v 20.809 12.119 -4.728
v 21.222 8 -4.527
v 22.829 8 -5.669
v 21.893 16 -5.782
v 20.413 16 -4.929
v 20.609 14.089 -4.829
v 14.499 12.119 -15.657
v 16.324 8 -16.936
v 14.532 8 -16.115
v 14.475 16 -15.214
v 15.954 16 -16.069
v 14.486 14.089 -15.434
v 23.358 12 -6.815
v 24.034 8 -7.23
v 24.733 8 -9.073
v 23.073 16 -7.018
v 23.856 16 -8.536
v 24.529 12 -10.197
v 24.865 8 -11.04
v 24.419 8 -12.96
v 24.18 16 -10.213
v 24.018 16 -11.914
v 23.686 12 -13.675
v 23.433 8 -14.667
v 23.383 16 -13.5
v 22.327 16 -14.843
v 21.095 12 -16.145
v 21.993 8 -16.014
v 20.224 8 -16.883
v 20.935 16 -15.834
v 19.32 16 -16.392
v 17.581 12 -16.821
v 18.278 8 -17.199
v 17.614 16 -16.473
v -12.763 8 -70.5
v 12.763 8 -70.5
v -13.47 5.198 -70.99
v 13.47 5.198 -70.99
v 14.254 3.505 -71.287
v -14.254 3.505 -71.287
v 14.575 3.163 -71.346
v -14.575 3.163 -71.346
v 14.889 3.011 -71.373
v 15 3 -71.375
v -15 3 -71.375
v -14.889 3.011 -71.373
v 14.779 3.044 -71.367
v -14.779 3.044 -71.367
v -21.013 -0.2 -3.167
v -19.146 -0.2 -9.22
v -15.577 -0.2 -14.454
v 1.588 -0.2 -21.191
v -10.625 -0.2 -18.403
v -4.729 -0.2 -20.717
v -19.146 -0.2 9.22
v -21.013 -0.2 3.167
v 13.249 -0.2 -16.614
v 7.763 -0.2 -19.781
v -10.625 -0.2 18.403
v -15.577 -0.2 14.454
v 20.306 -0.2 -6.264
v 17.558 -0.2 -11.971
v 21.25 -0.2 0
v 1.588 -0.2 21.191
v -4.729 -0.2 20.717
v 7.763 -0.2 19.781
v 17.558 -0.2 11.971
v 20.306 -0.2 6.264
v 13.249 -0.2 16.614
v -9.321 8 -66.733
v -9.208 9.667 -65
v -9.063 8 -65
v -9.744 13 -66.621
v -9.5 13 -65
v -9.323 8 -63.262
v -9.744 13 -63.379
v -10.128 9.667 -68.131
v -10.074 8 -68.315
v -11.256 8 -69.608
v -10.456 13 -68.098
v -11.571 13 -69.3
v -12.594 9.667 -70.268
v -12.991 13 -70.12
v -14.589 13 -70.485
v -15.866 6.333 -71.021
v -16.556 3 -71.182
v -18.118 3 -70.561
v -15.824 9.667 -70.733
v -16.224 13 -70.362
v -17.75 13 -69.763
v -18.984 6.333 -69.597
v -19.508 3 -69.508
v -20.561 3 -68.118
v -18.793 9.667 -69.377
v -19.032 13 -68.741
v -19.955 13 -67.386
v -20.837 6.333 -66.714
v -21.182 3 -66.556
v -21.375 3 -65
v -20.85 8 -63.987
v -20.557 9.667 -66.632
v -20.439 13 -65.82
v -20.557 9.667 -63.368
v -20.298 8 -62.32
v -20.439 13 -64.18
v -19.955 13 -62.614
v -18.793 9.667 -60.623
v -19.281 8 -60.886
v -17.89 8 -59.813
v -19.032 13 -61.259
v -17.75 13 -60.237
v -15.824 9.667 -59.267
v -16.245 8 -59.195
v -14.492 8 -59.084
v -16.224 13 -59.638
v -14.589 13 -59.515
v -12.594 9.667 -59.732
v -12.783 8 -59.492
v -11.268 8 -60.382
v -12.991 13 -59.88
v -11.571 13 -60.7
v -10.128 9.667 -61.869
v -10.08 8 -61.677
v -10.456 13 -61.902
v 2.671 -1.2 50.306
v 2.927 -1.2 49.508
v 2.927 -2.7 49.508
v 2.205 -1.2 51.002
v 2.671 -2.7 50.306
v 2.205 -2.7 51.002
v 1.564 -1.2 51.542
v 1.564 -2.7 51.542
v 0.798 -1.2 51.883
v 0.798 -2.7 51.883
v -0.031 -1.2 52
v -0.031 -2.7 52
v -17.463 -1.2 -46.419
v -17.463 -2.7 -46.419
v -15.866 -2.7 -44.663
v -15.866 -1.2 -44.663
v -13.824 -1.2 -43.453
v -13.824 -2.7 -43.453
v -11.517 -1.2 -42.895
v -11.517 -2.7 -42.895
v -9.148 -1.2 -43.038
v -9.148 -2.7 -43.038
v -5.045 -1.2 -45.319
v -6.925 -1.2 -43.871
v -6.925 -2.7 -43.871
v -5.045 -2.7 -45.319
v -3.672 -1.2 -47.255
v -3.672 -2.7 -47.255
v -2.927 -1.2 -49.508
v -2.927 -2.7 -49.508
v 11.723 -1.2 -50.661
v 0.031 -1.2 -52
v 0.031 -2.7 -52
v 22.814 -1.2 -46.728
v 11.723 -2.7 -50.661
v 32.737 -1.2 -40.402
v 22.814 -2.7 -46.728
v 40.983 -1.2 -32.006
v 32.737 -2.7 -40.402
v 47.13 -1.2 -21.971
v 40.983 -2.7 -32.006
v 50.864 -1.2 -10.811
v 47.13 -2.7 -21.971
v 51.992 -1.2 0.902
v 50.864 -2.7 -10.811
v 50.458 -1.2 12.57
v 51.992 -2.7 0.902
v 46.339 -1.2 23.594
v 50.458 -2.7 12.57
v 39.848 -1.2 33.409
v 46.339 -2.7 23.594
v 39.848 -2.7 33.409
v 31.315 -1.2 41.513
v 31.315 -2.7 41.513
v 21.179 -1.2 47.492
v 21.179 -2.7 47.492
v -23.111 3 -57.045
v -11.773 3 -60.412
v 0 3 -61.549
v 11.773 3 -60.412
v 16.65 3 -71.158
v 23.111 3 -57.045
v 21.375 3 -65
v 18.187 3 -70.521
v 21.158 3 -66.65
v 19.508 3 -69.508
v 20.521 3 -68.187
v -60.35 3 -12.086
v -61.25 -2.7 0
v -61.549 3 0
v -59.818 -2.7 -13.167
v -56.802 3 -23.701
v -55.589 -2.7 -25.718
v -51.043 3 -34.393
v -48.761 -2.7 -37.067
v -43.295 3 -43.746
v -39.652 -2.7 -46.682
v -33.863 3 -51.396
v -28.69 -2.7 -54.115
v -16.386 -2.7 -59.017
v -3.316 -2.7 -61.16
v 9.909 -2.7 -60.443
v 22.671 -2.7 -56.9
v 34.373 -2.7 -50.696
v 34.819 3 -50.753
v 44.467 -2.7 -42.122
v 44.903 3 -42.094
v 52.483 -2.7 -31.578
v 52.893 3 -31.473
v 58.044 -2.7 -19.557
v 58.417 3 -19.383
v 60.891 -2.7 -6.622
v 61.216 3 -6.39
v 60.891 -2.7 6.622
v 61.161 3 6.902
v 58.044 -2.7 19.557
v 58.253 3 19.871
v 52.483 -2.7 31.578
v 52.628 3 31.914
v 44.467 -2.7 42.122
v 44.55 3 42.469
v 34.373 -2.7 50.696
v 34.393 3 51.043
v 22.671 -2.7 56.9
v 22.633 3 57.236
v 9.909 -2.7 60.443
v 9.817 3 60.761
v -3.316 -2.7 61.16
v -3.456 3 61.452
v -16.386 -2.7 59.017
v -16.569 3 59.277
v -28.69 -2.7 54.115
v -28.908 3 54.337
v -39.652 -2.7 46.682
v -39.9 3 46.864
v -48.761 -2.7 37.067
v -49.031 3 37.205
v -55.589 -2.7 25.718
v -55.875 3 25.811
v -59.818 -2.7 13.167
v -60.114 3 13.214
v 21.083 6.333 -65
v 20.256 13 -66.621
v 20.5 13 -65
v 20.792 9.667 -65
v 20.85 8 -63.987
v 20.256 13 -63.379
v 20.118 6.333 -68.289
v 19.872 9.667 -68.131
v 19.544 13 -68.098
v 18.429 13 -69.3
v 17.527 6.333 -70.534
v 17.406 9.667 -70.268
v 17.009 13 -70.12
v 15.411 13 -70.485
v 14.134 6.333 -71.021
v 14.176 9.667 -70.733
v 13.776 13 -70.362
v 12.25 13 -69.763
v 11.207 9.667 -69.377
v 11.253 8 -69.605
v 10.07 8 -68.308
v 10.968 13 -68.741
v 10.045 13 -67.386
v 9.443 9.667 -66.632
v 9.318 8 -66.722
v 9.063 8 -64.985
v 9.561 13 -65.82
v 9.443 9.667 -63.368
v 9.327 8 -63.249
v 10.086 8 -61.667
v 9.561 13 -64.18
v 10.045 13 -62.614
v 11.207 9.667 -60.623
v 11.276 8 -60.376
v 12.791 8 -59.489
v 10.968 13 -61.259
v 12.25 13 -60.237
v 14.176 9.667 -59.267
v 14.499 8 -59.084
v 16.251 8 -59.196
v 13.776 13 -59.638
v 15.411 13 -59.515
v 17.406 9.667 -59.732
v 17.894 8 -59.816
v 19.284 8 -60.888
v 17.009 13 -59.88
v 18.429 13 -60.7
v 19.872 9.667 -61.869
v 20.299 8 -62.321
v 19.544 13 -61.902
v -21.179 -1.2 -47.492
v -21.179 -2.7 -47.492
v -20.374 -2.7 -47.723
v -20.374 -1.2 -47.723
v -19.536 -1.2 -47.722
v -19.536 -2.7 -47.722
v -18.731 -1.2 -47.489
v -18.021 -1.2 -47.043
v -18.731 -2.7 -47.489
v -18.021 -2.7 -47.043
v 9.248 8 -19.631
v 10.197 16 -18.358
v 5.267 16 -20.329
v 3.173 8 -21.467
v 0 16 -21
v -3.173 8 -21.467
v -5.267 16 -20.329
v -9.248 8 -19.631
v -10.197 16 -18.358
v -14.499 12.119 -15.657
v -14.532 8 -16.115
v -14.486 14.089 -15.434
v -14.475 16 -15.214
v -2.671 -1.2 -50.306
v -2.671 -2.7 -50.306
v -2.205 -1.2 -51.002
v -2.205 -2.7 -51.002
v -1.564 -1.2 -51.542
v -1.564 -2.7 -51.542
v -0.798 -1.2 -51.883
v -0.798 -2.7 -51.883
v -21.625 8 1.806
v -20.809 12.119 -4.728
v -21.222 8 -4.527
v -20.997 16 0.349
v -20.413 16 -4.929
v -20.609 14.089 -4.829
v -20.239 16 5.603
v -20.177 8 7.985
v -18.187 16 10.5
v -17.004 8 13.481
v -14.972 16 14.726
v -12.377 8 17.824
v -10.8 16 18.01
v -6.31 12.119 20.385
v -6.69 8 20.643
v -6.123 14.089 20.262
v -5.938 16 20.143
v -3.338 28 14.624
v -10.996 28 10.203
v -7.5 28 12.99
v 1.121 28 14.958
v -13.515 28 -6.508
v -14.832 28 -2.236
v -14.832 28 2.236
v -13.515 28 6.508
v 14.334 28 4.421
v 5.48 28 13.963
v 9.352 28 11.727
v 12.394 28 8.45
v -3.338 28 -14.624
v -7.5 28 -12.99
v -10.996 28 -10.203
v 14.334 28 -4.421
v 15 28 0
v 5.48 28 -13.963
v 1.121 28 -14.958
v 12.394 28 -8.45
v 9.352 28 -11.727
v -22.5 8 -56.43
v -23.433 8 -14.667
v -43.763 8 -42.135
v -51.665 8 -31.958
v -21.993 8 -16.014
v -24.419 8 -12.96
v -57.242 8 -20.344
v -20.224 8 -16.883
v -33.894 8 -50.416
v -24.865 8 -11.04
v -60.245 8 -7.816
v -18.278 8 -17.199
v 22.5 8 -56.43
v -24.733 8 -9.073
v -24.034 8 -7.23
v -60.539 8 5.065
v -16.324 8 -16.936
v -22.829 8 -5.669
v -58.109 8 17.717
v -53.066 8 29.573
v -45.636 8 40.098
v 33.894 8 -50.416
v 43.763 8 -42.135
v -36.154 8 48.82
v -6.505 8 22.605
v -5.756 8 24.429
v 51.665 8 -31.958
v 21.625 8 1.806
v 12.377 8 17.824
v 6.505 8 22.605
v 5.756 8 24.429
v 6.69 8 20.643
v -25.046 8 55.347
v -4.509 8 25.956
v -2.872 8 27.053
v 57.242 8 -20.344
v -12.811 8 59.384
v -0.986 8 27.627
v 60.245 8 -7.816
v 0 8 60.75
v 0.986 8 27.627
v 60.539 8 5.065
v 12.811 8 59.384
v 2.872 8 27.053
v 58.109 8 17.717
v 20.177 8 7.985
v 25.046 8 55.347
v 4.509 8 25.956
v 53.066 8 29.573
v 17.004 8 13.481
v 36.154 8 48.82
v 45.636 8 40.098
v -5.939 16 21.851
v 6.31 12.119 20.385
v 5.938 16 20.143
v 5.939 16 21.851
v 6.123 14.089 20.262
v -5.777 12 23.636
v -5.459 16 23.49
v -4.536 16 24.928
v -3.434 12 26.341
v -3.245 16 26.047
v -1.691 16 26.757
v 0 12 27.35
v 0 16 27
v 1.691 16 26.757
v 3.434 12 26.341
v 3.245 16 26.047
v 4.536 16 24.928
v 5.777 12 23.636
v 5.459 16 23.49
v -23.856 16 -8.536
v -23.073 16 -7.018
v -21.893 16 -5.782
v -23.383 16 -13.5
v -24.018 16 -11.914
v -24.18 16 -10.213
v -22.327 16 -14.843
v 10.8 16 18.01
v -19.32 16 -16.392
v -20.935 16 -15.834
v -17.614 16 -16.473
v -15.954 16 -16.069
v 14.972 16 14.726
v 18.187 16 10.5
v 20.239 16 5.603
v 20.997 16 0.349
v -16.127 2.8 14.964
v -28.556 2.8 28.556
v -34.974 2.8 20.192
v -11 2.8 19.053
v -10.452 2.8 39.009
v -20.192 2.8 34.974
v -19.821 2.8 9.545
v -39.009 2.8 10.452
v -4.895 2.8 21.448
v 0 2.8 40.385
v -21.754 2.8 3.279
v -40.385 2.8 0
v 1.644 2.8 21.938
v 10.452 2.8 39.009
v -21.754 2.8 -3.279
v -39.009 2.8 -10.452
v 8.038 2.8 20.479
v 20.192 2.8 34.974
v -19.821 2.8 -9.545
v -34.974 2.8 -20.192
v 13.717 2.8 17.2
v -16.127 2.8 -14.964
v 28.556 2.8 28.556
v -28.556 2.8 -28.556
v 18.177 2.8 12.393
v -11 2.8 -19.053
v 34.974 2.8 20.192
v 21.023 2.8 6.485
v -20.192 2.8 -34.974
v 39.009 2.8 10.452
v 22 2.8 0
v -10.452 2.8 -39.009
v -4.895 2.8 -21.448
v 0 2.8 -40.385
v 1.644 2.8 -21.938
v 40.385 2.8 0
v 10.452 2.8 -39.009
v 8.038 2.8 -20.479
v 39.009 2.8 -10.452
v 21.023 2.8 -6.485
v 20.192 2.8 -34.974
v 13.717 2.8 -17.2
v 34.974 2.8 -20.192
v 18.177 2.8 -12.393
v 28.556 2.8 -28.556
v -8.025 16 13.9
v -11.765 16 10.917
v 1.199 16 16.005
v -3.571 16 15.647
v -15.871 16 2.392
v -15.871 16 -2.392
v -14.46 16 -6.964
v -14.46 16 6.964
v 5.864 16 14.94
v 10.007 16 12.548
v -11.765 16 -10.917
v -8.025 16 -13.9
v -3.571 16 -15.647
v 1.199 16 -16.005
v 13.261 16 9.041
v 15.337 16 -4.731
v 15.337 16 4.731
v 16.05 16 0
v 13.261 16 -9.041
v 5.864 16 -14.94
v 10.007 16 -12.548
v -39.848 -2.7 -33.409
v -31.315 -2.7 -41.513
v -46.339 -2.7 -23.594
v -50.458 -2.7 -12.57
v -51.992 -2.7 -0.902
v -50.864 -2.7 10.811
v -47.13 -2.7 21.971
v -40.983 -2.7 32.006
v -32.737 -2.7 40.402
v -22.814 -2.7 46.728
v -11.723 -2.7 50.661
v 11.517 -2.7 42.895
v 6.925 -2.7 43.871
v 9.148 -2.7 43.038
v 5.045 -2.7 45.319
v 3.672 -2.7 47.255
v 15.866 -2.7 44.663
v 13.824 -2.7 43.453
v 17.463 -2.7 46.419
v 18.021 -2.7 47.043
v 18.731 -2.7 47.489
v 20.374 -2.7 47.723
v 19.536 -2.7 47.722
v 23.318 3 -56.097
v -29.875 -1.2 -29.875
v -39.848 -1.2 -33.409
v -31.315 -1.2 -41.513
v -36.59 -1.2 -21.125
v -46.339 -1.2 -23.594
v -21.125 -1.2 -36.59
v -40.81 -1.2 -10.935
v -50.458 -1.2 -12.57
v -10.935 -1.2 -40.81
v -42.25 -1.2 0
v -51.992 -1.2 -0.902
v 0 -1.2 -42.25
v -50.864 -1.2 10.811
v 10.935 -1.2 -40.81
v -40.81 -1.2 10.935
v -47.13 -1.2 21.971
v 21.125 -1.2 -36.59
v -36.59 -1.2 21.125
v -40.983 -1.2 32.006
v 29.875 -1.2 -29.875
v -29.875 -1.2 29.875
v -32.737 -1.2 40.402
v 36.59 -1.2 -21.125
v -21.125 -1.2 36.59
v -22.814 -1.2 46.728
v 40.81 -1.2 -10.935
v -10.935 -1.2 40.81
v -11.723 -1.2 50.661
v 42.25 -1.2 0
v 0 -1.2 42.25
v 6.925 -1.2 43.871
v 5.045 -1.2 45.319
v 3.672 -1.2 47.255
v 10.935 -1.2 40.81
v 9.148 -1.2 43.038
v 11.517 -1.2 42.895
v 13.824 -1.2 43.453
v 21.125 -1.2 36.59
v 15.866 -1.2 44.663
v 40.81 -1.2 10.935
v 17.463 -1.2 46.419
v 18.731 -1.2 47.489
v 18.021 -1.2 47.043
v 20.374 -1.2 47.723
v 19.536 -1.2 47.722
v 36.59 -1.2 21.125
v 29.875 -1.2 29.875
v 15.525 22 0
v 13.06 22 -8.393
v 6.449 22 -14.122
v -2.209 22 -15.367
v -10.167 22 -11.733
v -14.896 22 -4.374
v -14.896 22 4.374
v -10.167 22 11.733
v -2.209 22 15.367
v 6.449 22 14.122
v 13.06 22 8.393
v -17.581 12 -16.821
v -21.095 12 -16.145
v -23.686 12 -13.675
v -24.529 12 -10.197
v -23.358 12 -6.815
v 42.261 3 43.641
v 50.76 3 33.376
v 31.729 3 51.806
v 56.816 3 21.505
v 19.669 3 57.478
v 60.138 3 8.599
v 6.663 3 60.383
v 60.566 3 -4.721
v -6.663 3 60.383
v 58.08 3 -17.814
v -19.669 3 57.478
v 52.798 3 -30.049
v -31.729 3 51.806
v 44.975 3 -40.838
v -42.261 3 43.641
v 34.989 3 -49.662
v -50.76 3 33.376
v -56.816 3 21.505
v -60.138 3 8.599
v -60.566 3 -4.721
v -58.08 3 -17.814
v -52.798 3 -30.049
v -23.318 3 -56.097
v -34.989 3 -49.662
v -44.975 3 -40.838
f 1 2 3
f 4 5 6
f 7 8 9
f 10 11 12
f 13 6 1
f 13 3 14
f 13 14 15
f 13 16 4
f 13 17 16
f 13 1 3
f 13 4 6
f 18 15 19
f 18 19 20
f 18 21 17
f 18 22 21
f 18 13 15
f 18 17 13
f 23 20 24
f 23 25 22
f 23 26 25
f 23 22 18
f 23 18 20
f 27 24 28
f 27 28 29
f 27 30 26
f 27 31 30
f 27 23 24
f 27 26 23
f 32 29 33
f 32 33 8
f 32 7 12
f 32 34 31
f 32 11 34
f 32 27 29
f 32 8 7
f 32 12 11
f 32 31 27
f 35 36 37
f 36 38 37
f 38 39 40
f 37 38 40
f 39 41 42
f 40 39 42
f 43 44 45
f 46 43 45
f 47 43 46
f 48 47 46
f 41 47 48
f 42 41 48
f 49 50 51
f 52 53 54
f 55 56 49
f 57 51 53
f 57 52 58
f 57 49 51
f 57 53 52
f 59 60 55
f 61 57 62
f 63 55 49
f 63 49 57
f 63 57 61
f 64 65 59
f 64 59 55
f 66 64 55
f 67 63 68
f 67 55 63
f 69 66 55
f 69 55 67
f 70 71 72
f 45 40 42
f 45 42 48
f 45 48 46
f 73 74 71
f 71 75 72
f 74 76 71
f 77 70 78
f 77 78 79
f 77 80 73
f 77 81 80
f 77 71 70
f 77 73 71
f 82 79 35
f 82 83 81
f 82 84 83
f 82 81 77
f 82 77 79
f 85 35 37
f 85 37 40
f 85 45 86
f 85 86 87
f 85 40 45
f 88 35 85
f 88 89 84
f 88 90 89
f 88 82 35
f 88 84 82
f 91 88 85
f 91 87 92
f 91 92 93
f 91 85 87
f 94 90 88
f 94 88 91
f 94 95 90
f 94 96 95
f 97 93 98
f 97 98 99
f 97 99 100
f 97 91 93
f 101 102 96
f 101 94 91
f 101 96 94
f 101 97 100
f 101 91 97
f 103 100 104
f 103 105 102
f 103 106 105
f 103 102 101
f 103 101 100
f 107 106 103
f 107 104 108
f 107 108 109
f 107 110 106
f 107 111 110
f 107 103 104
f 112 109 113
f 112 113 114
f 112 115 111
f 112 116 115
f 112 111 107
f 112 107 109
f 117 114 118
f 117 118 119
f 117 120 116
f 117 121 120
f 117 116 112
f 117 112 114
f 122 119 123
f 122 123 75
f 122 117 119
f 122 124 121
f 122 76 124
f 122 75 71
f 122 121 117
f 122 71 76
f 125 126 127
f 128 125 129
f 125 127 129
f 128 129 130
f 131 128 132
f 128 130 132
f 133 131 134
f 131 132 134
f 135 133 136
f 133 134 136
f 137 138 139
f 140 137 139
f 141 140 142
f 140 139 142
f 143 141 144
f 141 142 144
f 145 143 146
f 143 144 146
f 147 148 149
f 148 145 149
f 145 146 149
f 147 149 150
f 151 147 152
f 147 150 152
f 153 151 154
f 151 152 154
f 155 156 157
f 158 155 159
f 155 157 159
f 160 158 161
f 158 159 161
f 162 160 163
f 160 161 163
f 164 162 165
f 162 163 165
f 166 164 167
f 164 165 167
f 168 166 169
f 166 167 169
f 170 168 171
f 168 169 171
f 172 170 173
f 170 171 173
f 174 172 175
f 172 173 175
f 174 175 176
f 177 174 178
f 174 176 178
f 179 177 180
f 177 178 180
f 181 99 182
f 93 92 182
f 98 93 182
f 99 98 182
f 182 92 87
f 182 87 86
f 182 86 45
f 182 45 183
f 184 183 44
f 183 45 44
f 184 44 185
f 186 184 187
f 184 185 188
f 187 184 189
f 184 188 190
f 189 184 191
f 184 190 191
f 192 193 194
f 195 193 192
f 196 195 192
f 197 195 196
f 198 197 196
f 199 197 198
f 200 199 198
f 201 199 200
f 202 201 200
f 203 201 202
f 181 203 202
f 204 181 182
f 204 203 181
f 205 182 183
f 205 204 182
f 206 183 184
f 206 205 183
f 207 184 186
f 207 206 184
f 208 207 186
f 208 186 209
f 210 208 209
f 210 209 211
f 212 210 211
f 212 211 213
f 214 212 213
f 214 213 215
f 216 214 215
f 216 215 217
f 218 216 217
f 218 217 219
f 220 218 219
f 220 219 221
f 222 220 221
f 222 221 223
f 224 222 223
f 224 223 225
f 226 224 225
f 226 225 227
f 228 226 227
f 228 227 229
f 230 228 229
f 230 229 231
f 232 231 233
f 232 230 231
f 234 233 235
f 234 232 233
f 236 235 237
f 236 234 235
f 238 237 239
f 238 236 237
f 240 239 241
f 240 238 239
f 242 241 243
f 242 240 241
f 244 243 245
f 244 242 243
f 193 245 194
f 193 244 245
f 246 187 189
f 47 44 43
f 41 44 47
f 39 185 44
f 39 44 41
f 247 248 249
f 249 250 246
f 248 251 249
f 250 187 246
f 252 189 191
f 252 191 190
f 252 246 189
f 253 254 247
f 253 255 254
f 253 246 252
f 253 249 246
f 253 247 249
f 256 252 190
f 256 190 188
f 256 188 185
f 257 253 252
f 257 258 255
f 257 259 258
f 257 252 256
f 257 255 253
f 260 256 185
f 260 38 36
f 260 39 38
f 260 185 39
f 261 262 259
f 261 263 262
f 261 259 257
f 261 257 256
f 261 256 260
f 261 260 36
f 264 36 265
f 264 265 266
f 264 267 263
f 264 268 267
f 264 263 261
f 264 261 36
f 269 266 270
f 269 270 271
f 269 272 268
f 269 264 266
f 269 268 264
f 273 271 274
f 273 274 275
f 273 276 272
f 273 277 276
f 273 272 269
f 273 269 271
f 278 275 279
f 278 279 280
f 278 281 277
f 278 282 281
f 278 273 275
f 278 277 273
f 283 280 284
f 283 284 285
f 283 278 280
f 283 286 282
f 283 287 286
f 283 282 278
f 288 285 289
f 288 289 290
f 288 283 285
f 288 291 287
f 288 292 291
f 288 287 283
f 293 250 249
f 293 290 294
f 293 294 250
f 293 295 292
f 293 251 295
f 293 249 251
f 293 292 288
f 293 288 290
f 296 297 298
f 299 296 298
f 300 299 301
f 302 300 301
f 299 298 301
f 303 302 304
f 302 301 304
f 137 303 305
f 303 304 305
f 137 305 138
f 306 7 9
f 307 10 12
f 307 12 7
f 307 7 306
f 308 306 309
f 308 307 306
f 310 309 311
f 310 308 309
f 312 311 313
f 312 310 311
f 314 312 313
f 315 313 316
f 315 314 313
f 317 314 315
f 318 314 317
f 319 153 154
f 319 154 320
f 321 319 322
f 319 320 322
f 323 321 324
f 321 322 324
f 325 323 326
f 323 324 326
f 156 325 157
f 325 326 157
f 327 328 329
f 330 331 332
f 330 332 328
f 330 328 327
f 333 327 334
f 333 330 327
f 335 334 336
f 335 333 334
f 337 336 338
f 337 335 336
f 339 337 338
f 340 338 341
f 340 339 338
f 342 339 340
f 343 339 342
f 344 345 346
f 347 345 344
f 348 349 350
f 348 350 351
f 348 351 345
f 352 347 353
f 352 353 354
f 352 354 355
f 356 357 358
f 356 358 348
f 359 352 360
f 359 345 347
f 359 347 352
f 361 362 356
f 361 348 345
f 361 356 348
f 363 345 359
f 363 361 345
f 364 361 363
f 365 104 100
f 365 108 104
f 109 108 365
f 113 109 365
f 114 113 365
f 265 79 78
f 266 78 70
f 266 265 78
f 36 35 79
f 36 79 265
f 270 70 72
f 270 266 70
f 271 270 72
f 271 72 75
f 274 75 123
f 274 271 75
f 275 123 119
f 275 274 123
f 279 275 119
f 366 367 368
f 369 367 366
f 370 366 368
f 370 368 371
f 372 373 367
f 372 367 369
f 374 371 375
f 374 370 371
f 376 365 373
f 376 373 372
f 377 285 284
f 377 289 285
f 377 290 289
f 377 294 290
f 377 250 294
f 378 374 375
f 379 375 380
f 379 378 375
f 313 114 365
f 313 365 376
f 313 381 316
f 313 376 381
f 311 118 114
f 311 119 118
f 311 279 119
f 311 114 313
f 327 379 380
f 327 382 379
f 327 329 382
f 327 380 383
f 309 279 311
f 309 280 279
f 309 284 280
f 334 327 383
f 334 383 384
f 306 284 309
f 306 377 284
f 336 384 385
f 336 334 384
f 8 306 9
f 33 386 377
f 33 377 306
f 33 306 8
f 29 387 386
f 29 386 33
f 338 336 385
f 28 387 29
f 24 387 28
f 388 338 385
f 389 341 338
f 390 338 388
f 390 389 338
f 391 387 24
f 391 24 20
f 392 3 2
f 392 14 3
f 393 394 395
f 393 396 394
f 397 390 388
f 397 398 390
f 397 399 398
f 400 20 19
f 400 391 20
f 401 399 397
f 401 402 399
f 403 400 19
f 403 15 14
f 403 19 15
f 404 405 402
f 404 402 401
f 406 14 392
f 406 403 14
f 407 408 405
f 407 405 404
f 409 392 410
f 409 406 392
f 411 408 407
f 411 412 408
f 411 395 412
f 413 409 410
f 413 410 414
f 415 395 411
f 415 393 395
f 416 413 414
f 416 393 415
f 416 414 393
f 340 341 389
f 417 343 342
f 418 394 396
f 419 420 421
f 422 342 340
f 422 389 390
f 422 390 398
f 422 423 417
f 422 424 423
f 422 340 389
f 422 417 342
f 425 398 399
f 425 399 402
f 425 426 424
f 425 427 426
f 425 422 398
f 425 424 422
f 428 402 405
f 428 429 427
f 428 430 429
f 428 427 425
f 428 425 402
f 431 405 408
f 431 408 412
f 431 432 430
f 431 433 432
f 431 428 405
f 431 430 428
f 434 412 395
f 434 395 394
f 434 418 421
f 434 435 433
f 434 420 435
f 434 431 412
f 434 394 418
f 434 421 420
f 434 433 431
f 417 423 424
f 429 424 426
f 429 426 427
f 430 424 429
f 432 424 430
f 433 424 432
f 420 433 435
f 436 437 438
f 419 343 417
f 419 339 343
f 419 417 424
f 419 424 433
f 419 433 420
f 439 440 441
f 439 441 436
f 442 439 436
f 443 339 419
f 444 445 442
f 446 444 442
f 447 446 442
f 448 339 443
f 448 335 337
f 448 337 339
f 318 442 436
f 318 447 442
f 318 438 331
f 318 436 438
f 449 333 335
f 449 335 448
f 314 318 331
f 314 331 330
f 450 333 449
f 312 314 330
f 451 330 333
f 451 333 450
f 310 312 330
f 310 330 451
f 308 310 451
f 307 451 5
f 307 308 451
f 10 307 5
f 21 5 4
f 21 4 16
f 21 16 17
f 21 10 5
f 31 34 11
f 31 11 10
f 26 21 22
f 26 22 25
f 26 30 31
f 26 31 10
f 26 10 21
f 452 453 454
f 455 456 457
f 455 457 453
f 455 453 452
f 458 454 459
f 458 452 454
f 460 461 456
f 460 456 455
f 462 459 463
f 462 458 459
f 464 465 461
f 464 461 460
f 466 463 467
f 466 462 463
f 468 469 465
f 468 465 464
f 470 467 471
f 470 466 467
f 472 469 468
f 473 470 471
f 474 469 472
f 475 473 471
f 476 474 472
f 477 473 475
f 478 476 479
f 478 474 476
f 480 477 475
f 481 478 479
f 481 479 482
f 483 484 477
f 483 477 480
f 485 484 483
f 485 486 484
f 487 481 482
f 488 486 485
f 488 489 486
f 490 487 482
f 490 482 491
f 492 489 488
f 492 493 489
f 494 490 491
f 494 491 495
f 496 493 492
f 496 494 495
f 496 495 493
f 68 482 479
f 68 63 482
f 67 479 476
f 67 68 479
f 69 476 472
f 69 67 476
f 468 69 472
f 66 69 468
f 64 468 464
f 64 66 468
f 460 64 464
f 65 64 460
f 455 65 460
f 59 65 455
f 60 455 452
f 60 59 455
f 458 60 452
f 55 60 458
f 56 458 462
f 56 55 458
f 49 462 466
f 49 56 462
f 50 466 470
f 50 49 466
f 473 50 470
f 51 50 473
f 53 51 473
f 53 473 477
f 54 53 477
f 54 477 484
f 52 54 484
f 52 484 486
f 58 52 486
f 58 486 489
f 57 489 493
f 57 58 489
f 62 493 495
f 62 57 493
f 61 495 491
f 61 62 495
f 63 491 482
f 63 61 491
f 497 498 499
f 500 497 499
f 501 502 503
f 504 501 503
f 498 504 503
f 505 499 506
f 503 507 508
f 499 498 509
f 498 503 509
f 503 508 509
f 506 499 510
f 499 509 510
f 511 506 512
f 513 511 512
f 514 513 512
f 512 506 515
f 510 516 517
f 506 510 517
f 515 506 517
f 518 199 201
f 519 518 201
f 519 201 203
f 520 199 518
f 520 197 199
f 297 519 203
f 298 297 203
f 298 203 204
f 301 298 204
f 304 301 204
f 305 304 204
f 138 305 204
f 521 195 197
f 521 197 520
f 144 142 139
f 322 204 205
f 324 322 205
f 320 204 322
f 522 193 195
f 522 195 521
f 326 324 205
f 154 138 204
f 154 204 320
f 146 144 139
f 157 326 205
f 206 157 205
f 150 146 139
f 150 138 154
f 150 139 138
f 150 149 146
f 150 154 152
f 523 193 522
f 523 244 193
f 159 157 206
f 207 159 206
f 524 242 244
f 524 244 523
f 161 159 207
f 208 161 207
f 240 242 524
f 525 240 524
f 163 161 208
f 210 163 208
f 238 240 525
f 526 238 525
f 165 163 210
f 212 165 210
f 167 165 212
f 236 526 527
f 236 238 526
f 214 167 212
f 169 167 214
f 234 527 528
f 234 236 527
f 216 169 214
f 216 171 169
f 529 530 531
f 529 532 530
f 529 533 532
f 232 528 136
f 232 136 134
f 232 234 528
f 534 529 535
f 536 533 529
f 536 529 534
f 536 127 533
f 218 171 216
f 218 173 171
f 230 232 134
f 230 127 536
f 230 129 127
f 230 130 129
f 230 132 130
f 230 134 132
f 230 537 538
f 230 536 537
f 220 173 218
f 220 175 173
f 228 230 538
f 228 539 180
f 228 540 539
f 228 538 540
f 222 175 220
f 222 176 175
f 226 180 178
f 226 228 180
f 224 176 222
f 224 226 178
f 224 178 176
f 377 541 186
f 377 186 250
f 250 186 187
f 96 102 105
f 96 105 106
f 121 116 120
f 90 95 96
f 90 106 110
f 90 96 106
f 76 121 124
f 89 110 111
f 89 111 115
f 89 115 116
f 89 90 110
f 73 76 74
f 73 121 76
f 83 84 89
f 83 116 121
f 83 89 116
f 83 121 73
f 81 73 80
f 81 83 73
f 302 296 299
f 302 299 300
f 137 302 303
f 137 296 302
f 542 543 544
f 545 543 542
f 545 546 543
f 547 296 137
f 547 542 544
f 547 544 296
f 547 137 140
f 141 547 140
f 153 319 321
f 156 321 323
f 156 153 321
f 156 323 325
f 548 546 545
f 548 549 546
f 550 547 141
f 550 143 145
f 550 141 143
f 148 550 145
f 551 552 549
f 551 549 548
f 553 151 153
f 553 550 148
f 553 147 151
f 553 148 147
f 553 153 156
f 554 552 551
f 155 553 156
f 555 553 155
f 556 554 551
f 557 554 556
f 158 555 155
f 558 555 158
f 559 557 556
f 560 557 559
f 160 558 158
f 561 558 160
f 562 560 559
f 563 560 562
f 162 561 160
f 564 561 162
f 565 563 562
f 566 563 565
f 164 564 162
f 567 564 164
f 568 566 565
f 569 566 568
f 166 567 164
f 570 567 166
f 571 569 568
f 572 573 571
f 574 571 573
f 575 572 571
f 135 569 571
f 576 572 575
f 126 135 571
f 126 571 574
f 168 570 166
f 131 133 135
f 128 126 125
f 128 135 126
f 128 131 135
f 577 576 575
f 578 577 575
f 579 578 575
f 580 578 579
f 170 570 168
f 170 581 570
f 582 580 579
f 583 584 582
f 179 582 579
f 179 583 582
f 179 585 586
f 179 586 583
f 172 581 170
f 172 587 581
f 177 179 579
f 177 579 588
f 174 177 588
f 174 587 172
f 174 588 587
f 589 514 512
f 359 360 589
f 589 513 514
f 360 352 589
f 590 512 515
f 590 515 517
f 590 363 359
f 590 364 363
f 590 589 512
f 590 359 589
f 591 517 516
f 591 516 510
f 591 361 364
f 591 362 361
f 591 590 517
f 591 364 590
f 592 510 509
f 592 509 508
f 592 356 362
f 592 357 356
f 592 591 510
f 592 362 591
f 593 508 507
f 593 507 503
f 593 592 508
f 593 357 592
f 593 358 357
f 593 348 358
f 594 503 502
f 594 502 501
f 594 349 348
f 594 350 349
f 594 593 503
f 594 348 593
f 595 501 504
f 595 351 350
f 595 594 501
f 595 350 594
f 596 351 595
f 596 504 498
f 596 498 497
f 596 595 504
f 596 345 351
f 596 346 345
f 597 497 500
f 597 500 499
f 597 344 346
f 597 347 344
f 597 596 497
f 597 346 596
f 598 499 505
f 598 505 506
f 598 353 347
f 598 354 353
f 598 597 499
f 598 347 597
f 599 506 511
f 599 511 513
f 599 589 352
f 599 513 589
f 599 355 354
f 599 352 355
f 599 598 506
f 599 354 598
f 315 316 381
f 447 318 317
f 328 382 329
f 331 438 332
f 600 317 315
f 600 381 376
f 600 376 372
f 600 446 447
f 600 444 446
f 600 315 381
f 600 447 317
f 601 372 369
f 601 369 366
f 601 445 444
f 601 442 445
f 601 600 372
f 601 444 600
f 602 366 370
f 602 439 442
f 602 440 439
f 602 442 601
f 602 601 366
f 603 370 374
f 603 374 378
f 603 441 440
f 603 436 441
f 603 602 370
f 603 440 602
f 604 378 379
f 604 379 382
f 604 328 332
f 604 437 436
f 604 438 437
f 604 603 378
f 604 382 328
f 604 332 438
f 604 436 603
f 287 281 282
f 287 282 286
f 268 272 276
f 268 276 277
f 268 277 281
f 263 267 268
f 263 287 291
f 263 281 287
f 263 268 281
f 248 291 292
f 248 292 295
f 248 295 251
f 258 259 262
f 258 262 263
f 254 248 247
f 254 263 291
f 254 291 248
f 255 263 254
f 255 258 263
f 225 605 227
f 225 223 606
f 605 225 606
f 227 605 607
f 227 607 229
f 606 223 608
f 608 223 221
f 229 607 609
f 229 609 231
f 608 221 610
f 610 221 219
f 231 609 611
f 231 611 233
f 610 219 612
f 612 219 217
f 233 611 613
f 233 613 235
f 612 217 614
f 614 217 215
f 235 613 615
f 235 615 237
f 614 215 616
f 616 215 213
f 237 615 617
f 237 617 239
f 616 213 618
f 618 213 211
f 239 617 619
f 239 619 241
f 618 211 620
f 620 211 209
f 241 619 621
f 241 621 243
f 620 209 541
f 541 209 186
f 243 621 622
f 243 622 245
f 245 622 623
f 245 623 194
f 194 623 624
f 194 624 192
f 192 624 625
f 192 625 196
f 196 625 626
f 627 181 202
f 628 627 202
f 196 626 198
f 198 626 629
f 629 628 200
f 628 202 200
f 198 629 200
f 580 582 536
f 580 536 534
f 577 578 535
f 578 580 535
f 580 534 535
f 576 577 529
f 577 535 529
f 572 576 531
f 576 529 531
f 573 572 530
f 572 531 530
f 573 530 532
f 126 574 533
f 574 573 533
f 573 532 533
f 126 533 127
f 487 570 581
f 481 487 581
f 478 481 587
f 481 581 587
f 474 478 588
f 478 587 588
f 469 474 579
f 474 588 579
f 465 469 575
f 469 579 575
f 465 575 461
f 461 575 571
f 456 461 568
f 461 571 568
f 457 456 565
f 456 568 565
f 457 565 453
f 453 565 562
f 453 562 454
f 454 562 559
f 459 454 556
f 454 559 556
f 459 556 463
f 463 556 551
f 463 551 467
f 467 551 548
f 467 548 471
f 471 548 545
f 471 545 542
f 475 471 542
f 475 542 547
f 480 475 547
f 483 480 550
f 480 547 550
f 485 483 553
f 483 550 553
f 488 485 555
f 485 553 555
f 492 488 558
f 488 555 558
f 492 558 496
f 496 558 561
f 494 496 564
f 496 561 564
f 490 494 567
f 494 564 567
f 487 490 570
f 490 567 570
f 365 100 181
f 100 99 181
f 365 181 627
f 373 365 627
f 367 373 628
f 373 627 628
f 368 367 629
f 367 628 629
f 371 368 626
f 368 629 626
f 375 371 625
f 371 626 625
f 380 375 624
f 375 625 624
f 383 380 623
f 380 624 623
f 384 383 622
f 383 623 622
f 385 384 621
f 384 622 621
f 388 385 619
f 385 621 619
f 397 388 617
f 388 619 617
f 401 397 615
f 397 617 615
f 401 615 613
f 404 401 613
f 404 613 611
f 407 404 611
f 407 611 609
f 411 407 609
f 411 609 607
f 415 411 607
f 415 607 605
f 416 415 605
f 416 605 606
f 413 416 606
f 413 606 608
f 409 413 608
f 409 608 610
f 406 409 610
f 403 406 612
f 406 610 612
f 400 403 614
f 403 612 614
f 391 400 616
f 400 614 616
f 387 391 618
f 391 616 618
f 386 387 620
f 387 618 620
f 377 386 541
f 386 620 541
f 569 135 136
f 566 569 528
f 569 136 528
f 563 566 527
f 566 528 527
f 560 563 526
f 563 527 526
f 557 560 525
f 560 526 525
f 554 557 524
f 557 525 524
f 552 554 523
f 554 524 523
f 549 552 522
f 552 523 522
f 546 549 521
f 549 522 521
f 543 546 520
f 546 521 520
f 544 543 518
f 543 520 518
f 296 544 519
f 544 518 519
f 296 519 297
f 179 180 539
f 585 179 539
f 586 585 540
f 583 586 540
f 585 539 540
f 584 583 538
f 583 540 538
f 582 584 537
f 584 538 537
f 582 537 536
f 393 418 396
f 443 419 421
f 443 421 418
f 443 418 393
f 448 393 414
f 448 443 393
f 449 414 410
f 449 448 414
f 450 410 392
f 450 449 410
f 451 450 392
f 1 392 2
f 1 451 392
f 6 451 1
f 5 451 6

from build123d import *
from build123d.topology import SkipClean

# Parameters (mm, degrees)
SKETCH1_R                      = 60.75
BOSS_EXTRUDE1_DEPTH            = 8
BOSS_EXTRUDE3_DEPTH            = 8
SKETCH3_R                      = 15
SKETCH3_R_2                    = 10
BOSS_EXTRUDE4_DEPTH            = 12
BOSS_EXTRUDE5_START            = -5
BOSS_EXTRUDE5_DEPTH            = 5
SKETCH5_R                      = 5.500000000000001
SKETCH5_R_2                    = 5.499999999999997
BOSS_EXTRUDE6_DEPTH            = 5
SKETCH11_R                     = 52
CUT_EXTRUDE4_DEPTH             = 1
SKETCH12_R                     = 42.5
CUT_EXTRUDE5_DEPTH             = 4
BOSS_EXTRUDE7_START            = 2
SKETCH13_R                     = 21
SKETCH13_R_2                   = 10
BOSS_EXTRUDE7_DEPTH            = 2
BOSS_EXTRUDE8_START            = 2.2
SKETCH14_R                     = 60.75
SKETCH14_R_2                   = 52.000000000000014
BOSS_EXTRUDE8_DEPTH            = 2.2
BOSS_EXTRUDE9_START            = 2.2
SKETCH15_R                     = 52.000000000000014
SKETCH15_R_2                   = 42.500000000000014
BOSS_EXTRUDE9_DEPTH            = 2.2
BOSS_EXTRUDE10_START           = 2.2
SKETCH16_R                     = 42.50000000000002
SKETCH16_R_2                   = 21
BOSS_EXTRUDE10_DEPTH           = 2.2
BOSS_EXTRUDE11_START           = 2.2
SKETCH17_R                     = 21
SKETCH17_R_2                   = 10
BOSS_EXTRUDE11_DEPTH           = 2.2
BOSS_EXTRUDE12_REACH           = 99.841
SKETCH20_R                     = 14.5
CUT_EXTRUDE6_DEPTH             = 6
BOSS_EXTRUDE13_START           = 6
SKETCH22_R                     = 14.5
BOSS_EXTRUDE13_DEPTH           = 6
SKETCH23_R                     = 10
BOSS_EXTRUDE14_DEPTH           = 12
CUT_EXTRUDE7_START             = -12
SKETCH24_R                     = 15
CUT_EXTRUDE7_DEPTH             = 12
CUT_EXTRUDE8_START             = -8
CUT_EXTRUDE8_DEPTH             = 8
BOSS_EXTRUDE16_DEPTH           = 8
BOSS_EXTRUDE16_DRAFT           = 5
SKETCH25_R                     = 15
BOSS_EXTRUDE15_DEPTH           = 12
BOSS_EXTRUDE15_DRAFT           = 5.000000000000003
CUT_EXTRUDE9_START             = -5
SKETCH29_R                     = 5.500000000000004
SKETCH29_R_2                   = 5.499999999999987
CUT_EXTRUDE9_DEPTH             = 5
SKETCH30_R                     = 5.499999999999987
BOSS_EXTRUDE17_DEPTH           = 10
BOSS_EXTRUDE17_DRAFT           = 5.000000000000003
SKETCH30_R_2                   = 5.500000000000005
BOSS_EXTRUDE17_PROFILE_2_DEPTH = 10
BOSS_EXTRUDE17_PROFILE_2_DRAFT = 5.000000000000003
CUT_EXTRUDE14_START            = 10
SKETCH40_R                     = 42.75
SKETCH40_R_2                   = 21
CUT_EXTRUDE14_DEPTH            = 10
SKETCH43_R                     = 20.82502267294815
BOSS_EXTRUDE19_DEPTH           = 1
BOSS_EXTRUDE19_TAPER           = 5.000000000000003
SKETCH45_R                     = 61.25
SKETCH45_R_2                   = 60.75
BOSS_EXTRUDE21_DEPTH           = 5.7
BOSS_EXTRUDE21_DRAFT           = 3.000000000000002
BOSS_EXTRUDE22_START           = 0.5
SKETCH46_R                     = 60.75
BOSS_EXTRUDE22_DEPTH           = 0.5
SKETCH47_R                     = 22
SKETCH48_R                     = 21.25
SKETCH50_R                     = 43.099954654103705
SKETCH50_R_2                   = 42.25000000000001
BOSS_EXTRUDE23_DEPTH           = 4
BOSS_EXTRUDE23_DRAFT           = 25.000000000000018


# Read off the part's stored shape, not the designer's step: Boss-Extrude16, Cut-Extrude15
with BuildPart() as part:
    # Sketch1 → Boss-Extrude1 (new body)
    with BuildSketch(Plane(origin=(0, 0, 0), x_dir=(1, 0, 0), z_dir=(0, 1, 0))):
        with Locations(Location((0, 0, 0), (0, 0, 270))):
            Circle(SKETCH1_R)
    extrude(amount=BOSS_EXTRUDE1_DEPTH)

    # Sketch2 → Boss-Extrude3 (add)
    with BuildSketch(Plane(origin=(0, 8, 0), x_dir=(1, 0, 0), z_dir=(0, 1, 0))):
        with BuildLine():
            ThreePointArc((5.938459911664728, -20.142857142857142), (-6.444e-14, -27.000000000000057), (-5.938459911664823, -20.142857142857114))
            ThreePointArc((-5.938459911664823, -20.142857142857114), (-18.186533479473233, -10.499999999999973), (-20.413455946347497, 4.928571428571383))
            ThreePointArc((-20.413455946347497, 4.928571428571383), (-23.382685902179873, 13.499999999999936), (-14.474996034682798, 15.214285714285683))
            ThreePointArc((-14.474996034682798, 15.214285714285683), (1.29e-15, 21.000000000000004), (14.474996034682793, 15.214285714285687))
            ThreePointArc((14.474996034682793, 15.214285714285687), (23.38268590217988, 13.499999999999948), (20.413455946347494, 4.928571428571376))
            ThreePointArc((20.413455946347494, 4.928571428571376), (18.186533479473198, -10.500000000000021), (5.938459911664728, -20.142857142857142))
        make_face()
    extrude(amount=BOSS_EXTRUDE3_DEPTH)

    # Sketch3 → Boss-Extrude4 (add)
    with BuildSketch(Plane(origin=(0, 16, 0), x_dir=(1, 0, 0), z_dir=(0, 1, 0))):
        with Locations(Location((0, 0, 0), (0, 0, 270))):
            Circle(SKETCH3_R)
        with Locations(Location((0, 0, 0), (0, 0, 270))):
            Circle(SKETCH3_R_2, mode=Mode.SUBTRACT)
    extrude(amount=BOSS_EXTRUDE4_DEPTH)

    # Sketch4 → Boss-Extrude5 (add)
    with BuildSketch(Plane(origin=(0, 8, 0), x_dir=(1, 0, 0), z_dir=(0, 1, 0)).offset(BOSS_EXTRUDE5_START)):
        with BuildLine():
            Line((-15.000000000000002, 70.5), (15.000000000000002, 70.5))
            ThreePointArc((15.000000000000002, 70.5), (18.449606964363085, 69.2837147187246), (20.37350259165708, 66.17280428778827))
            Line((20.37350259165708, 66.17280428778827), (22.5, 56.42971291793003))
            ThreePointArc((22.5, 56.42971291793003), (3.72e-15, 60.75), (-22.5, 56.42971291793003))
            Line((-22.5, 56.42971291793003), (-20.37350259165708, 66.17280428778827))
            ThreePointArc((-20.37350259165708, 66.17280428778827), (-18.449606964363085, 69.2837147187246), (-15.000000000000002, 70.5))
        make_face()
    extrude(amount=BOSS_EXTRUDE5_DEPTH)

    # Sketch5 → Boss-Extrude6 (add)
    with SkipClean():  # the faces are left unmerged after this step: merging them gives an invalid solid
        with BuildSketch(Plane(origin=(0, 8, 0), x_dir=(1, 0, 0), z_dir=(0, 1, 0))):
            with Locations(Location((-15, 64.99999999999999, 0), (0, 0, 270))):
                Circle(SKETCH5_R)
            with Locations(Location((15, 64.99999999999999, 0), (0, 0, 90))):
                Circle(SKETCH5_R_2)
        extrude(amount=BOSS_EXTRUDE6_DEPTH)

    # Sketch11 → Cut-Extrude4 (cut)
    with SkipClean():  # the faces are left unmerged after this step: merging them gives an invalid solid
        with BuildSketch(Plane.XZ):
            with Locations(Location((0, 0, 0), (0, 0, 270))):
                Circle(SKETCH11_R)
        extrude(amount=-CUT_EXTRUDE4_DEPTH, mode=Mode.SUBTRACT)

    # Sketch12 → Cut-Extrude5 (cut)
    with SkipClean():  # the faces are left unmerged after this step: merging them gives an invalid solid
        with BuildSketch(Plane.XZ.offset(-1)):
            with Locations(Location((0, 0, 0), (0, 0, 270))):
                Circle(SKETCH12_R)
        extrude(amount=-CUT_EXTRUDE5_DEPTH, mode=Mode.SUBTRACT)

    # Sketch13 → Boss-Extrude7 (add)
    with SkipClean():  # the faces are left unmerged after this step: merging them gives an invalid solid
        with BuildSketch(Plane.XZ.offset(-5).offset(BOSS_EXTRUDE7_START)):
            with Locations(Location((0, 0, 0), (0, 0, 270))):
                Circle(SKETCH13_R)
            with Locations(Location((0, 0, 0), (0, 0, 90))):
                Circle(SKETCH13_R_2, mode=Mode.SUBTRACT)
        extrude(amount=-BOSS_EXTRUDE7_DEPTH)

    # Sketch14 → Boss-Extrude8 (add)
    with BuildSketch(Plane.XZ.offset(BOSS_EXTRUDE8_START)):
        with Locations(Location((0, 0, 0), (0, 0, 270))):
            Circle(SKETCH14_R)
        with Locations(Location((0, 0, 0), (0, 0, 270))):
            Circle(SKETCH14_R_2, mode=Mode.SUBTRACT)
    extrude(amount=-BOSS_EXTRUDE8_DEPTH)

    # Sketch15 → Boss-Extrude9 (add)
    with BuildSketch(Plane.XZ.offset(-1).offset(BOSS_EXTRUDE9_START)):
        with Locations(Location((0, 0, 0), (0, 0, 270))):
            Circle(SKETCH15_R)
        with Locations(Location((0, 0, 0), (0, 0, 270))):
            Circle(SKETCH15_R_2, mode=Mode.SUBTRACT)
    extrude(amount=-BOSS_EXTRUDE9_DEPTH)

    # Sketch16 → Boss-Extrude10 (add)
    with BuildSketch(Plane.XZ.offset(-5).offset(BOSS_EXTRUDE10_START)):
        with Locations(Location((0, 0, 0), (0, 0, 270))):
            Circle(SKETCH16_R)
        with Locations(Location((0, 0, 0), (0, 0, 270))):
            Circle(SKETCH16_R_2, mode=Mode.SUBTRACT)
    extrude(amount=-BOSS_EXTRUDE10_DEPTH)

    # Sketch17 → Boss-Extrude11 (add)
    with BuildSketch(Plane.XZ.offset(-3).offset(BOSS_EXTRUDE11_START)):
        with Locations(Location((0, 0, 0), (0, 0, 270))):
            Circle(SKETCH17_R)
        with Locations(Location((0, 0, 0), (0, 0, 90))):
            Circle(SKETCH17_R_2, mode=Mode.SUBTRACT)
    extrude(amount=-BOSS_EXTRUDE11_DEPTH)

    # Sketch18 → Boss-Extrude12 (add, up to next)
    with BuildSketch(Plane.XZ.offset(2.2), mode=Mode.PRIVATE) as boss_extrude12_sk1:
        with BuildLine():
            ThreePointArc((0, 52), (-0.01568724474421835, 51.99999763375334), (-0.03137448806074861, 51.99999053501355))
            ThreePointArc((-0.03137448806074783, 51.99999053501355), (1.9030265971459484, 51.294569899693556), (2.9270643996395953, 49.508268578457944))
            ThreePointArc((2.9270643996395966, 49.508268578457944), (9.148114395981406, 43.03849443228744), (17.46282057957898, 46.41859822357625))
            ThreePointArc((17.46282057957898, 46.41859822357625), (19.124879865422606, 47.63395198340303), (21.178963611238554, 47.49159399676782))
            ThreePointArc((21.17896361123856, 47.491593996767826), (10.826751871361822, 50.86041136204036), (3.18e-15, 52.00000000000001))
        make_face()
    boss_extrude12_tool1 = extrude(boss_extrude12_sk1.sketch, amount=-BOSS_EXTRUDE12_REACH, mode=Mode.PRIVATE) - part.part
    # Sketch18 → Boss-Extrude12 (add, up to next)
    with BuildSketch(Plane.XZ.offset(2.2), mode=Mode.PRIVATE) as boss_extrude12_sk2:
        with BuildLine():
            ThreePointArc((0.03137448806111159, -51.99999053501355), (-1.9030265971455897, -51.29456989969357), (-2.9270643996392525, -49.508268578457965))
            ThreePointArc((-2.9270643996392494, -49.508268578457965), (-9.148114395981109, -43.0384944322875), (-17.46282057957866, -46.418598223576375))
            ThreePointArc((-17.46282057957866, -46.418598223576375), (-19.124879865422272, -47.633951983403165), (-21.17896361123822, -47.49159399676797))
            ThreePointArc((-21.17896361123824, -47.49159399676797), (-10.81140792252315, -50.863675238157974), (0.03137448806108981, -51.99999053501356))
        make_face()
    boss_extrude12_tool2 = extrude(boss_extrude12_sk2.sketch, amount=-BOSS_EXTRUDE12_REACH, mode=Mode.PRIVATE) - part.part
    add(boss_extrude12_tool1.solids().sort_by_distance((10.097222, -2.2, 47.503693))[0])
    add(boss_extrude12_tool2.solids().sort_by_distance((-10.097222, -2.2, -47.503693))[0])

    # Sketch20 → Cut-Extrude6 (cut)
    with BuildSketch(Plane.XZ.offset(-0.7999999999999999)):
        with Locations(Location((0, 0, 0), (0, 0, 270))):
            Circle(SKETCH20_R)
    extrude(amount=-CUT_EXTRUDE6_DEPTH, mode=Mode.SUBTRACT)

    # Sketch22 → Boss-Extrude13 (add)
    with BuildSketch(Plane.XZ.offset(-6.800000000000001).offset(BOSS_EXTRUDE13_START)):
        Circle(SKETCH22_R)
    extrude(amount=-BOSS_EXTRUDE13_DEPTH)

    # Sketch23 → Boss-Extrude14 (add)
    with BuildSketch(Plane(origin=(0, 16, 0), x_dir=(1, 0, 0), z_dir=(0, 1, 0))):
        Circle(SKETCH23_R)
    extrude(amount=BOSS_EXTRUDE14_DEPTH)

    # Sketch24 → Cut-Extrude7 (cut)
    with BuildSketch(Plane(origin=(0, 28, 0), x_dir=(1, 0, 0), z_dir=(0, 1, 0)).offset(CUT_EXTRUDE7_START)):
        Circle(SKETCH24_R)
    extrude(amount=CUT_EXTRUDE7_DEPTH, mode=Mode.SUBTRACT)

    # Sketch26 → Cut-Extrude8 (cut)
    with BuildSketch(Plane(origin=(0, 16, 0), x_dir=(1, 0, 0), z_dir=(0, 1, 0)).offset(CUT_EXTRUDE8_START)):
        with BuildLine():
            ThreePointArc((5.938459911664719, -20.142857142857142), (18.186533479473198, -10.500000000000023), (20.413455946347494, 4.928571428571378))
            ThreePointArc((20.413455946347494, 4.928571428571378), (23.38268590217988, 13.499999999999948), (14.474996034682793, 15.214285714285683))
            ThreePointArc((14.474996034682793, 15.214285714285683), (-8.04e-15, 21), (-14.474996034682805, 15.214285714285678))
            ThreePointArc((-14.474996034682805, 15.214285714285678), (-23.382685902179873, 13.49999999999994), (-20.4134559463475, 4.928571428571381))
            ThreePointArc((-20.4134559463475, 4.928571428571381), (-18.186533479473237, -10.499999999999975), (-5.938459911664835, -20.142857142857114))
            ThreePointArc((-5.938459911664835, -20.142857142857114), (-6.191e-14, -27.000000000000068), (5.938459911664719, -20.142857142857142))
        make_face()
    extrude(amount=CUT_EXTRUDE8_DEPTH, mode=Mode.SUBTRACT)


with BuildPart() as boss_extrude16_tool:
    # Boss-Extrude16 outline → Boss-Extrude16 (with draft: the straight prism first)
    with BuildSketch(Plane(origin=(0, 16, 0), x_dir=(1, 0, 0), z_dir=(0, 1, 0))):
        with BuildLine():
            ThreePointArc((-5.938459912, -20.142857143), (0, -27), (5.938459912, -20.142857143))
            ThreePointArc((5.938459912, -20.142857143), (18.186533479, -10.5), (20.413455946, 4.928571429))
            ThreePointArc((20.413455946, 4.928571429), (23.382685902, 13.5), (14.474996035, 15.214285714))
            ThreePointArc((14.474996035, 15.214285714), (0, 21), (-14.474996035, 15.214285714))
            ThreePointArc((-14.474996035, 15.214285714), (-23.382685902, 13.5), (-20.413455946, 4.928571429))
            ThreePointArc((-20.413455946, 4.928571429), (-18.186533479, -10.5), (-5.938459912, -20.142857143))
        make_face()
    extrude(amount=-BOSS_EXTRUDE16_DEPTH)
    # Boss-Extrude16: the draft: its side faces are tilted about the plane it starts from
    boss_extrude16_sides = [boss_extrude16_tool.faces().sort_by_distance(p)[0] for p in [
        (0, 12, 27),
        (18.186533479, 12, 10.5),
        (23.382685902, 12, -13.5),
        (0, 12, -21),
        (-23.382685902, 12, -13.5),
        (-18.186533479, 12, 10.5),
    ]]
    draft(boss_extrude16_sides, Plane(origin=(0, 16, 0), x_dir=(1, 0, 0), z_dir=(0, 1, 0)), BOSS_EXTRUDE16_DRAFT)


with BuildPart() as part_1:
    add(part.part)

    # Boss-Extrude16: add boss_extrude16_tool
    add(boss_extrude16_tool.part)

    # Sketch29 → Cut-Extrude9 (cut)
    with BuildSketch(Plane(origin=(0, 13.000000000000002, 0), x_dir=(1, 0, 0), z_dir=(0, 1, 0)).offset(CUT_EXTRUDE9_START)):
        with Locations((-15, 64.99999999999999)):
            Circle(SKETCH29_R)
        with Locations((15, 64.99999999999999)):
            Circle(SKETCH29_R_2)
    extrude(amount=CUT_EXTRUDE9_DEPTH, mode=Mode.SUBTRACT)


with BuildPart() as body_2:
    # Sketch25 → Boss-Extrude15 (with draft: the straight prism first)
    with BuildSketch(Plane(origin=(0, 28, 0), x_dir=(1, 0, 0), z_dir=(0, 1, 0))):
        Circle(SKETCH25_R)
    extrude(amount=-BOSS_EXTRUDE15_DEPTH)
    # Boss-Extrude15: the draft: its side faces are tilted about the plane it starts from
    boss_extrude15_sides = [body_2.faces().sort_by_distance(p)[0] for p in [
        (-15, 22, 0),
    ]]
    draft(boss_extrude15_sides, Plane(origin=(0, 28, 0), x_dir=(1, 0, 0), z_dir=(0, 1, 0)), BOSS_EXTRUDE15_DRAFT)


with BuildPart() as boss_extrude17_tool:
    # Sketch30 → Boss-Extrude17 (with draft: the straight prism first)
    with BuildSketch(Plane(origin=(0, 13.000000000000002, 0), x_dir=(1, 0, 0), z_dir=(0, 1, 0))):
        with Locations((15, 64.99999999999999)):
            Circle(SKETCH30_R)
    extrude(amount=-BOSS_EXTRUDE17_DEPTH)
    # Boss-Extrude17: the draft: its side faces are tilted about the plane it starts from
    boss_extrude17_sides = [boss_extrude17_tool.faces().sort_by_distance(p)[0] for p in [
        (9.5, 8, -65),
    ]]
    draft(boss_extrude17_sides, Plane(origin=(0, 13.000000000000002, 0), x_dir=(1, 0, 0), z_dir=(0, 1, 0)), BOSS_EXTRUDE17_DRAFT)


with BuildPart() as part_2:
    add(part_1.part)

    # Boss-Extrude17: add boss_extrude17_tool
    add(boss_extrude17_tool.part)


with BuildPart() as boss_extrude17_profile_2_tool:
    # Sketch30 → Boss-Extrude17 profile 2 (with draft: the straight prism first)
    with BuildSketch(Plane(origin=(0, 13.000000000000002, 0), x_dir=(1, 0, 0), z_dir=(0, 1, 0))):
        with Locations((-15, 64.99999999999999)):
            Circle(SKETCH30_R_2)
    extrude(amount=-BOSS_EXTRUDE17_PROFILE_2_DEPTH)
    # Boss-Extrude17 profile 2: the draft: its side faces are tilted about the plane it starts from
    boss_extrude17_profile_2_sides = [boss_extrude17_profile_2_tool.faces().sort_by_distance(p)[0] for p in [
        (-20.5, 8, -65),
    ]]
    draft(boss_extrude17_profile_2_sides, Plane(origin=(0, 13.000000000000002, 0), x_dir=(1, 0, 0), z_dir=(0, 1, 0)), BOSS_EXTRUDE17_PROFILE_2_DRAFT)


with BuildPart() as part_3:
    add(part_2.part)

    # Boss-Extrude17 profile 2: add boss_extrude17_profile_2_tool
    add(boss_extrude17_profile_2_tool.part)

    # Sketch35 for Loft1 → Loft1 section 0
    with BuildSketch(Plane(origin=(0, 8, 0), x_dir=(1, 0, 0), z_dir=(0, 1, 0))):
        with BuildLine():
            Line((-20.85046947506008, 63.987458607535004), (-22.500000000000007, 56.42971291793004))
            # circular arc as an exact rational Bezier (weights 1, cos(half-angle), 1)
            Bezier((-22.500000000000007, 56.42971291793004), (0, 65.401050425), (22.500000000000004, 56.42971291793004), weights=[1, 0.928884163258, 1])
            Line((22.500000000000004, 56.42971291793004), (20.85046947506007, 63.98745860753506))
            Bezier((20.85046947506007, 63.98745860753506), (22.675263086, 74.531125659), (12.763209185000878, 70.5), weights=[1, 0.485191442362, 1])
            Line((12.763209185000878, 70.5), (-12.763209185000829, 70.5))
            Bezier((-12.763209185000829, 70.5), (-22.675263086, 74.531125659), (-20.85046947506008, 63.987458607535004), weights=[1, 0.485191442362, 1])
        make_face()
    # Sketch34 for Loft1 → Loft1 section 1
    with BuildSketch(Plane.XZ.offset(-3)):
        with BuildLine():
            Line((-21.374886635259248, -65.00000000000003), (-23.318116732321744, -56.09659465651917))
            Bezier((-23.318116732321744, -56.09659465651917), (0, -65.789421312), (23.318116732321744, -56.09659465651917), weights=[1, 0.923400735087, 1])
            Line((23.318116732321744, -56.09659465651917), (21.374886635259248, -65.00000000000003))
            Bezier((21.374886635259248, -65.00000000000003), (21.374886635, -71.374886635), (15.000000000000066, -71.37488663525922), weights=[1, 0.707106781187, 1])
            Line((15.000000000000066, -71.37488663525922), (-14.999999999999934, -71.37488663525923))
            Bezier((-14.999999999999934, -71.37488663525923), (-21.374886635, -71.374886635), (-21.374886635259248, -65.00000000000003), weights=[1, 0.707106781187, 1])
        make_face()
    loft()

    # Sketch40 → Cut-Extrude14 (cut)
    with BuildSketch(Plane.XZ.offset(-2.8).offset(CUT_EXTRUDE14_START)):
        with Locations(Location((0, 0, 0), (0, 0, 270))):
            Circle(SKETCH40_R)
        with Locations(Location((0, 0, 0), (0, 0, 270))):
            Circle(SKETCH40_R_2, mode=Mode.SUBTRACT)
    extrude(amount=-CUT_EXTRUDE14_DEPTH, mode=Mode.SUBTRACT)

    # Cut-Extrude15 outline → Cut-Extrude15 (revolve, cut)
    with BuildSketch(Plane.XY):
        Polygon((42.75, 2.8), (42.75, -1.2), (43.099954654, -1.2), align=None)
        Polygon((21, 0.8), (21, 2.8), (20.825022673, 0.8), align=None)
    revolve(axis=Axis((0, 0, 0), (0, 1, 0)), mode=Mode.SUBTRACT)

    # Sketch43 → Boss-Extrude19 (add)
    with BuildSketch(Plane.XZ.offset(-0.7999999999999999)):
        Circle(SKETCH43_R)
    extrude(amount=BOSS_EXTRUDE19_DEPTH, taper=BOSS_EXTRUDE19_TAPER)


with BuildPart() as boss_extrude21_tool:
    # Sketch45 → Boss-Extrude21 (with draft: the straight prism first)
    with BuildSketch(Plane(origin=(0, -2.7, 0), x_dir=(-1, 0, 0), z_dir=(0, -1, 0))):
        Circle(SKETCH45_R)
        Circle(SKETCH45_R_2, mode=Mode.SUBTRACT)
    extrude(amount=-BOSS_EXTRUDE21_DEPTH)
    # Boss-Extrude21: the draft: its side faces are tilted about the plane it starts from
    boss_extrude21_sides = [boss_extrude21_tool.faces().sort_by_distance(p)[0] for p in [
        (61.25, 0.15, 0),
        (60.75, 0.15, 0),
    ]]
    draft(boss_extrude21_sides, Plane(origin=(0, -2.7, 0), x_dir=(-1, 0, 0), z_dir=(0, -1, 0)), BOSS_EXTRUDE21_DRAFT)


with BuildPart() as part_4:
    add(part_3.part)

    # Boss-Extrude21: add boss_extrude21_tool
    add(boss_extrude21_tool.part)

    # Sketch46 → Boss-Extrude22 (add)
    with BuildSketch(Plane.XZ.offset(2.2).offset(BOSS_EXTRUDE22_START)):
        Circle(SKETCH46_R)
        with BuildLine():
            ThreePointArc((-0.03137448806074879, 51.99999053501356), (-50.86367523815793, 10.811407922523328), (-21.178963611238228, -47.491593996767975))
            ThreePointArc((-21.178963611238228, -47.491593996767975), (-19.124879865422272, -47.63395198340318), (-17.46282057957866, -46.418598223576375))
            ThreePointArc((-17.46282057957866, -46.418598223576375), (-9.14811439598111, -43.0384944322875), (-2.9270643996392507, -49.508268578457965))
            ThreePointArc((-2.9270643996392507, -49.508268578457965), (-1.9030265971455884, -51.29456989969357), (0.03137448806111191, -51.99999053501356))
            ThreePointArc((0.03137448806111191, -51.99999053501356), (50.86367523815794, -10.81140792252331), (21.17896361123855, 47.491593996767826))
            ThreePointArc((21.17896361123855, 47.491593996767826), (19.124879865422596, 47.63395198340304), (17.462820579578977, 46.41859822357625))
            ThreePointArc((17.462820579578977, 46.41859822357625), (9.148114395981402, 43.03849443228744), (2.927064399639594, 49.50826857845795))
            ThreePointArc((2.927064399639594, 49.50826857845795), (1.9030265971459435, 51.294569899693556), (-0.03137448806074879, 51.99999053501356))
        make_face(mode=Mode.SUBTRACT)
    extrude(amount=-BOSS_EXTRUDE22_DEPTH)

    # Sketch47 → Loft4 section 0
    with BuildSketch(Plane.XZ.offset(-2.8)):
        Circle(SKETCH47_R)
    # Sketch48 → Loft4 section 1
    with BuildSketch(Plane.XZ.offset(0.2000000000000001)):
        Circle(SKETCH48_R)
    loft()


with BuildPart() as boss_extrude23_tool:
    # Sketch50 → Boss-Extrude23 (with draft: the straight prism first)
    with BuildSketch(Plane.XZ.offset(1.2000000000000002)):
        Circle(SKETCH50_R)
        Circle(SKETCH50_R_2, mode=Mode.SUBTRACT)
    extrude(amount=-BOSS_EXTRUDE23_DEPTH)
    # Boss-Extrude23: the draft: its side faces are tilted about the plane it starts from
    boss_extrude23_sides = [boss_extrude23_tool.faces().sort_by_distance(p)[0] for p in [
        (-43.099954654, 0.8, 0),
        (-42.25, 0.8, 0),
    ]]
    draft(boss_extrude23_sides, Plane.XZ.offset(1.2000000000000002), BOSS_EXTRUDE23_DRAFT)


with BuildPart() as part_5:
    add(part_4.part)

    # Boss-Extrude23: add boss_extrude23_tool
    add(boss_extrude23_tool.part)


solid = Compound([body_2.part, part_5.part])
